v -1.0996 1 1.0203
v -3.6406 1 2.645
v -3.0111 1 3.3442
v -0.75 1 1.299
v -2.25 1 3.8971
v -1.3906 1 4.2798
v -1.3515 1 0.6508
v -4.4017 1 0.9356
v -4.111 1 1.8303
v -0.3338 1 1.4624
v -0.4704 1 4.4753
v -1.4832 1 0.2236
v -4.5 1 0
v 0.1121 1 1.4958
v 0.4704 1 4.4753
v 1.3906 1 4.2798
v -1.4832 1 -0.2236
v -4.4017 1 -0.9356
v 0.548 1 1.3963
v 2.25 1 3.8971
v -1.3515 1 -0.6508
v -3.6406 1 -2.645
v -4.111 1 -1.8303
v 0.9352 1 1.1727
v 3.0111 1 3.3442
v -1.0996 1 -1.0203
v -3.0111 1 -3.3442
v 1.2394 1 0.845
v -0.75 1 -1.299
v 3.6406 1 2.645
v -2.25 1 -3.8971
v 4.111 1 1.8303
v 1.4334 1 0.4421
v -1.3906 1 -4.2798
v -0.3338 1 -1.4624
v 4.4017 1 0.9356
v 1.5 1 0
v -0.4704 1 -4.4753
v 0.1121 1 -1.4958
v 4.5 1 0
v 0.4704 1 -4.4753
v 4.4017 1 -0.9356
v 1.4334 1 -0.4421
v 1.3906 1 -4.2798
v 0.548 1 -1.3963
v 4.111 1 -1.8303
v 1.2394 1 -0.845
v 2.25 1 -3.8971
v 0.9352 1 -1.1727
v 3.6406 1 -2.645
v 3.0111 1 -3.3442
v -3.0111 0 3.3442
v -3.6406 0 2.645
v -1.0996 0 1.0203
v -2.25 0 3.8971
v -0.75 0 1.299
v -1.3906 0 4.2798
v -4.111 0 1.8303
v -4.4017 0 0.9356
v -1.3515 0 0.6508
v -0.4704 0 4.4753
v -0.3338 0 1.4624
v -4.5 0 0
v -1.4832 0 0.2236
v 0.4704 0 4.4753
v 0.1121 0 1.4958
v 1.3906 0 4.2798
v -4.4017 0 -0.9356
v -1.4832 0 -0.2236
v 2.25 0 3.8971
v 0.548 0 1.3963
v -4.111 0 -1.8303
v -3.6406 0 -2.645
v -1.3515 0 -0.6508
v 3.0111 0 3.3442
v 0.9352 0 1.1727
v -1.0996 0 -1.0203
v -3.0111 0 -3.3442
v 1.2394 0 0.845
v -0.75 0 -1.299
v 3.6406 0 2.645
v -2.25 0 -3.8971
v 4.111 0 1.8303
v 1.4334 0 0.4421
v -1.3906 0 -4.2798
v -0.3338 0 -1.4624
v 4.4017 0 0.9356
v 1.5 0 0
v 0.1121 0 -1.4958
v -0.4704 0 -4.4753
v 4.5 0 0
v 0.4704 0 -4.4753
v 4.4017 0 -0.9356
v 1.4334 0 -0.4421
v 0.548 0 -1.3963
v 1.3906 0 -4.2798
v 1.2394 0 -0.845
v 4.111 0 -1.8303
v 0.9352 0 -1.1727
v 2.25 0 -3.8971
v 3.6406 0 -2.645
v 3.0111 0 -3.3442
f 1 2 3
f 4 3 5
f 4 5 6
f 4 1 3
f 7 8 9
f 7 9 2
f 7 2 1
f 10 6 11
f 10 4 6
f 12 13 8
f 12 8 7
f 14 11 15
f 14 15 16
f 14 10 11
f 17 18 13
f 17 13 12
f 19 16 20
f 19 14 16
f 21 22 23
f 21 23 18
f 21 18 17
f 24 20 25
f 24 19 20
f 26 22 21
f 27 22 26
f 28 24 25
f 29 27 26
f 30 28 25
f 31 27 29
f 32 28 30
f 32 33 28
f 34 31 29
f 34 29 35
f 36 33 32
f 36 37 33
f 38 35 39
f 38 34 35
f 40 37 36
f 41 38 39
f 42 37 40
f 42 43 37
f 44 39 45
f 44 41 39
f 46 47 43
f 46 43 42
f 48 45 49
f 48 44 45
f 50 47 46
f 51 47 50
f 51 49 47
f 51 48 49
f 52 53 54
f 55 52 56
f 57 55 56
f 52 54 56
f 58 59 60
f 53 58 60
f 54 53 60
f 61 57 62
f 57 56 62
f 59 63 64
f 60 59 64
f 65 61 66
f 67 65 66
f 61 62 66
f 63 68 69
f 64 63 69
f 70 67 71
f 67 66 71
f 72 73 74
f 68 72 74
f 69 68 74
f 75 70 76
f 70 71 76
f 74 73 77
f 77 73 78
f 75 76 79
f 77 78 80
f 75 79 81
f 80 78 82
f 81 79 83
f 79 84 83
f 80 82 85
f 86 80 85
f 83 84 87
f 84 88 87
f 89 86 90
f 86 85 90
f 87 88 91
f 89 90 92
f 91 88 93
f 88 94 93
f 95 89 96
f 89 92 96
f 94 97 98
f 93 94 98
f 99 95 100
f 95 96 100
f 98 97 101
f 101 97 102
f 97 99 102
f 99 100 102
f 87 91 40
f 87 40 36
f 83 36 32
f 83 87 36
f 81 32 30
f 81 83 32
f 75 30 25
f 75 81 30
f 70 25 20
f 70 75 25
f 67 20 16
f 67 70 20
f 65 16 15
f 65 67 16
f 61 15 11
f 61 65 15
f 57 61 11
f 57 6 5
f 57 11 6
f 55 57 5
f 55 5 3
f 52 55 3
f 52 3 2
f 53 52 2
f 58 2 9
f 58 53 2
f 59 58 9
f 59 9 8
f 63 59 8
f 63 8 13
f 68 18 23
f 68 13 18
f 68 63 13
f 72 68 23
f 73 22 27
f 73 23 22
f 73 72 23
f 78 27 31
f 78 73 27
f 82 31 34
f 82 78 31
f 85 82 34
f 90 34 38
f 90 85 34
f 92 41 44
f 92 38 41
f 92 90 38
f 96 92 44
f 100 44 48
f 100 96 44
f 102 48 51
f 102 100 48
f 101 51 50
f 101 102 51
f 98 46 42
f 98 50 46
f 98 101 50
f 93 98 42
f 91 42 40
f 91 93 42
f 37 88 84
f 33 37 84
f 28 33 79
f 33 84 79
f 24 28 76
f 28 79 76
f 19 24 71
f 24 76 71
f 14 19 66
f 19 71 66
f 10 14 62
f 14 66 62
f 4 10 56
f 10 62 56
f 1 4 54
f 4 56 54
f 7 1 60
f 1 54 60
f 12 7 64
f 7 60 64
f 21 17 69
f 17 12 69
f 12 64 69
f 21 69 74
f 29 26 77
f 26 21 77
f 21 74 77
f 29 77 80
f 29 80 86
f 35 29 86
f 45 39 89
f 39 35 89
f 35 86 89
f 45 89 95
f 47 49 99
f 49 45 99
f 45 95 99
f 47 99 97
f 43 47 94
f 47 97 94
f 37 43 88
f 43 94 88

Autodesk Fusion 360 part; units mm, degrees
sketch "Esboço1" plane through (0, 0, 0) normal (0, 1, 0) x (1, 0, 0)
  circle A0 centre (0, 0) radius 4.5
  circle A1 centre (0, 0) radius 1.5
  dimension "d1" = 9
  dimension "d2" = 3
extrude "Extrusão1" add sketch "Esboço1" along normal blind 1.5
extrude "Extrusão2" cut 1 faces at (3.4832, 1.5, 0.2236) along direction (0, -1, 0) blind 0.7
extrude "Extrusão3" add 1 faces at (3.4832, 0.8, 0.2236) along direction (0, 1, 0) blind 0.2
